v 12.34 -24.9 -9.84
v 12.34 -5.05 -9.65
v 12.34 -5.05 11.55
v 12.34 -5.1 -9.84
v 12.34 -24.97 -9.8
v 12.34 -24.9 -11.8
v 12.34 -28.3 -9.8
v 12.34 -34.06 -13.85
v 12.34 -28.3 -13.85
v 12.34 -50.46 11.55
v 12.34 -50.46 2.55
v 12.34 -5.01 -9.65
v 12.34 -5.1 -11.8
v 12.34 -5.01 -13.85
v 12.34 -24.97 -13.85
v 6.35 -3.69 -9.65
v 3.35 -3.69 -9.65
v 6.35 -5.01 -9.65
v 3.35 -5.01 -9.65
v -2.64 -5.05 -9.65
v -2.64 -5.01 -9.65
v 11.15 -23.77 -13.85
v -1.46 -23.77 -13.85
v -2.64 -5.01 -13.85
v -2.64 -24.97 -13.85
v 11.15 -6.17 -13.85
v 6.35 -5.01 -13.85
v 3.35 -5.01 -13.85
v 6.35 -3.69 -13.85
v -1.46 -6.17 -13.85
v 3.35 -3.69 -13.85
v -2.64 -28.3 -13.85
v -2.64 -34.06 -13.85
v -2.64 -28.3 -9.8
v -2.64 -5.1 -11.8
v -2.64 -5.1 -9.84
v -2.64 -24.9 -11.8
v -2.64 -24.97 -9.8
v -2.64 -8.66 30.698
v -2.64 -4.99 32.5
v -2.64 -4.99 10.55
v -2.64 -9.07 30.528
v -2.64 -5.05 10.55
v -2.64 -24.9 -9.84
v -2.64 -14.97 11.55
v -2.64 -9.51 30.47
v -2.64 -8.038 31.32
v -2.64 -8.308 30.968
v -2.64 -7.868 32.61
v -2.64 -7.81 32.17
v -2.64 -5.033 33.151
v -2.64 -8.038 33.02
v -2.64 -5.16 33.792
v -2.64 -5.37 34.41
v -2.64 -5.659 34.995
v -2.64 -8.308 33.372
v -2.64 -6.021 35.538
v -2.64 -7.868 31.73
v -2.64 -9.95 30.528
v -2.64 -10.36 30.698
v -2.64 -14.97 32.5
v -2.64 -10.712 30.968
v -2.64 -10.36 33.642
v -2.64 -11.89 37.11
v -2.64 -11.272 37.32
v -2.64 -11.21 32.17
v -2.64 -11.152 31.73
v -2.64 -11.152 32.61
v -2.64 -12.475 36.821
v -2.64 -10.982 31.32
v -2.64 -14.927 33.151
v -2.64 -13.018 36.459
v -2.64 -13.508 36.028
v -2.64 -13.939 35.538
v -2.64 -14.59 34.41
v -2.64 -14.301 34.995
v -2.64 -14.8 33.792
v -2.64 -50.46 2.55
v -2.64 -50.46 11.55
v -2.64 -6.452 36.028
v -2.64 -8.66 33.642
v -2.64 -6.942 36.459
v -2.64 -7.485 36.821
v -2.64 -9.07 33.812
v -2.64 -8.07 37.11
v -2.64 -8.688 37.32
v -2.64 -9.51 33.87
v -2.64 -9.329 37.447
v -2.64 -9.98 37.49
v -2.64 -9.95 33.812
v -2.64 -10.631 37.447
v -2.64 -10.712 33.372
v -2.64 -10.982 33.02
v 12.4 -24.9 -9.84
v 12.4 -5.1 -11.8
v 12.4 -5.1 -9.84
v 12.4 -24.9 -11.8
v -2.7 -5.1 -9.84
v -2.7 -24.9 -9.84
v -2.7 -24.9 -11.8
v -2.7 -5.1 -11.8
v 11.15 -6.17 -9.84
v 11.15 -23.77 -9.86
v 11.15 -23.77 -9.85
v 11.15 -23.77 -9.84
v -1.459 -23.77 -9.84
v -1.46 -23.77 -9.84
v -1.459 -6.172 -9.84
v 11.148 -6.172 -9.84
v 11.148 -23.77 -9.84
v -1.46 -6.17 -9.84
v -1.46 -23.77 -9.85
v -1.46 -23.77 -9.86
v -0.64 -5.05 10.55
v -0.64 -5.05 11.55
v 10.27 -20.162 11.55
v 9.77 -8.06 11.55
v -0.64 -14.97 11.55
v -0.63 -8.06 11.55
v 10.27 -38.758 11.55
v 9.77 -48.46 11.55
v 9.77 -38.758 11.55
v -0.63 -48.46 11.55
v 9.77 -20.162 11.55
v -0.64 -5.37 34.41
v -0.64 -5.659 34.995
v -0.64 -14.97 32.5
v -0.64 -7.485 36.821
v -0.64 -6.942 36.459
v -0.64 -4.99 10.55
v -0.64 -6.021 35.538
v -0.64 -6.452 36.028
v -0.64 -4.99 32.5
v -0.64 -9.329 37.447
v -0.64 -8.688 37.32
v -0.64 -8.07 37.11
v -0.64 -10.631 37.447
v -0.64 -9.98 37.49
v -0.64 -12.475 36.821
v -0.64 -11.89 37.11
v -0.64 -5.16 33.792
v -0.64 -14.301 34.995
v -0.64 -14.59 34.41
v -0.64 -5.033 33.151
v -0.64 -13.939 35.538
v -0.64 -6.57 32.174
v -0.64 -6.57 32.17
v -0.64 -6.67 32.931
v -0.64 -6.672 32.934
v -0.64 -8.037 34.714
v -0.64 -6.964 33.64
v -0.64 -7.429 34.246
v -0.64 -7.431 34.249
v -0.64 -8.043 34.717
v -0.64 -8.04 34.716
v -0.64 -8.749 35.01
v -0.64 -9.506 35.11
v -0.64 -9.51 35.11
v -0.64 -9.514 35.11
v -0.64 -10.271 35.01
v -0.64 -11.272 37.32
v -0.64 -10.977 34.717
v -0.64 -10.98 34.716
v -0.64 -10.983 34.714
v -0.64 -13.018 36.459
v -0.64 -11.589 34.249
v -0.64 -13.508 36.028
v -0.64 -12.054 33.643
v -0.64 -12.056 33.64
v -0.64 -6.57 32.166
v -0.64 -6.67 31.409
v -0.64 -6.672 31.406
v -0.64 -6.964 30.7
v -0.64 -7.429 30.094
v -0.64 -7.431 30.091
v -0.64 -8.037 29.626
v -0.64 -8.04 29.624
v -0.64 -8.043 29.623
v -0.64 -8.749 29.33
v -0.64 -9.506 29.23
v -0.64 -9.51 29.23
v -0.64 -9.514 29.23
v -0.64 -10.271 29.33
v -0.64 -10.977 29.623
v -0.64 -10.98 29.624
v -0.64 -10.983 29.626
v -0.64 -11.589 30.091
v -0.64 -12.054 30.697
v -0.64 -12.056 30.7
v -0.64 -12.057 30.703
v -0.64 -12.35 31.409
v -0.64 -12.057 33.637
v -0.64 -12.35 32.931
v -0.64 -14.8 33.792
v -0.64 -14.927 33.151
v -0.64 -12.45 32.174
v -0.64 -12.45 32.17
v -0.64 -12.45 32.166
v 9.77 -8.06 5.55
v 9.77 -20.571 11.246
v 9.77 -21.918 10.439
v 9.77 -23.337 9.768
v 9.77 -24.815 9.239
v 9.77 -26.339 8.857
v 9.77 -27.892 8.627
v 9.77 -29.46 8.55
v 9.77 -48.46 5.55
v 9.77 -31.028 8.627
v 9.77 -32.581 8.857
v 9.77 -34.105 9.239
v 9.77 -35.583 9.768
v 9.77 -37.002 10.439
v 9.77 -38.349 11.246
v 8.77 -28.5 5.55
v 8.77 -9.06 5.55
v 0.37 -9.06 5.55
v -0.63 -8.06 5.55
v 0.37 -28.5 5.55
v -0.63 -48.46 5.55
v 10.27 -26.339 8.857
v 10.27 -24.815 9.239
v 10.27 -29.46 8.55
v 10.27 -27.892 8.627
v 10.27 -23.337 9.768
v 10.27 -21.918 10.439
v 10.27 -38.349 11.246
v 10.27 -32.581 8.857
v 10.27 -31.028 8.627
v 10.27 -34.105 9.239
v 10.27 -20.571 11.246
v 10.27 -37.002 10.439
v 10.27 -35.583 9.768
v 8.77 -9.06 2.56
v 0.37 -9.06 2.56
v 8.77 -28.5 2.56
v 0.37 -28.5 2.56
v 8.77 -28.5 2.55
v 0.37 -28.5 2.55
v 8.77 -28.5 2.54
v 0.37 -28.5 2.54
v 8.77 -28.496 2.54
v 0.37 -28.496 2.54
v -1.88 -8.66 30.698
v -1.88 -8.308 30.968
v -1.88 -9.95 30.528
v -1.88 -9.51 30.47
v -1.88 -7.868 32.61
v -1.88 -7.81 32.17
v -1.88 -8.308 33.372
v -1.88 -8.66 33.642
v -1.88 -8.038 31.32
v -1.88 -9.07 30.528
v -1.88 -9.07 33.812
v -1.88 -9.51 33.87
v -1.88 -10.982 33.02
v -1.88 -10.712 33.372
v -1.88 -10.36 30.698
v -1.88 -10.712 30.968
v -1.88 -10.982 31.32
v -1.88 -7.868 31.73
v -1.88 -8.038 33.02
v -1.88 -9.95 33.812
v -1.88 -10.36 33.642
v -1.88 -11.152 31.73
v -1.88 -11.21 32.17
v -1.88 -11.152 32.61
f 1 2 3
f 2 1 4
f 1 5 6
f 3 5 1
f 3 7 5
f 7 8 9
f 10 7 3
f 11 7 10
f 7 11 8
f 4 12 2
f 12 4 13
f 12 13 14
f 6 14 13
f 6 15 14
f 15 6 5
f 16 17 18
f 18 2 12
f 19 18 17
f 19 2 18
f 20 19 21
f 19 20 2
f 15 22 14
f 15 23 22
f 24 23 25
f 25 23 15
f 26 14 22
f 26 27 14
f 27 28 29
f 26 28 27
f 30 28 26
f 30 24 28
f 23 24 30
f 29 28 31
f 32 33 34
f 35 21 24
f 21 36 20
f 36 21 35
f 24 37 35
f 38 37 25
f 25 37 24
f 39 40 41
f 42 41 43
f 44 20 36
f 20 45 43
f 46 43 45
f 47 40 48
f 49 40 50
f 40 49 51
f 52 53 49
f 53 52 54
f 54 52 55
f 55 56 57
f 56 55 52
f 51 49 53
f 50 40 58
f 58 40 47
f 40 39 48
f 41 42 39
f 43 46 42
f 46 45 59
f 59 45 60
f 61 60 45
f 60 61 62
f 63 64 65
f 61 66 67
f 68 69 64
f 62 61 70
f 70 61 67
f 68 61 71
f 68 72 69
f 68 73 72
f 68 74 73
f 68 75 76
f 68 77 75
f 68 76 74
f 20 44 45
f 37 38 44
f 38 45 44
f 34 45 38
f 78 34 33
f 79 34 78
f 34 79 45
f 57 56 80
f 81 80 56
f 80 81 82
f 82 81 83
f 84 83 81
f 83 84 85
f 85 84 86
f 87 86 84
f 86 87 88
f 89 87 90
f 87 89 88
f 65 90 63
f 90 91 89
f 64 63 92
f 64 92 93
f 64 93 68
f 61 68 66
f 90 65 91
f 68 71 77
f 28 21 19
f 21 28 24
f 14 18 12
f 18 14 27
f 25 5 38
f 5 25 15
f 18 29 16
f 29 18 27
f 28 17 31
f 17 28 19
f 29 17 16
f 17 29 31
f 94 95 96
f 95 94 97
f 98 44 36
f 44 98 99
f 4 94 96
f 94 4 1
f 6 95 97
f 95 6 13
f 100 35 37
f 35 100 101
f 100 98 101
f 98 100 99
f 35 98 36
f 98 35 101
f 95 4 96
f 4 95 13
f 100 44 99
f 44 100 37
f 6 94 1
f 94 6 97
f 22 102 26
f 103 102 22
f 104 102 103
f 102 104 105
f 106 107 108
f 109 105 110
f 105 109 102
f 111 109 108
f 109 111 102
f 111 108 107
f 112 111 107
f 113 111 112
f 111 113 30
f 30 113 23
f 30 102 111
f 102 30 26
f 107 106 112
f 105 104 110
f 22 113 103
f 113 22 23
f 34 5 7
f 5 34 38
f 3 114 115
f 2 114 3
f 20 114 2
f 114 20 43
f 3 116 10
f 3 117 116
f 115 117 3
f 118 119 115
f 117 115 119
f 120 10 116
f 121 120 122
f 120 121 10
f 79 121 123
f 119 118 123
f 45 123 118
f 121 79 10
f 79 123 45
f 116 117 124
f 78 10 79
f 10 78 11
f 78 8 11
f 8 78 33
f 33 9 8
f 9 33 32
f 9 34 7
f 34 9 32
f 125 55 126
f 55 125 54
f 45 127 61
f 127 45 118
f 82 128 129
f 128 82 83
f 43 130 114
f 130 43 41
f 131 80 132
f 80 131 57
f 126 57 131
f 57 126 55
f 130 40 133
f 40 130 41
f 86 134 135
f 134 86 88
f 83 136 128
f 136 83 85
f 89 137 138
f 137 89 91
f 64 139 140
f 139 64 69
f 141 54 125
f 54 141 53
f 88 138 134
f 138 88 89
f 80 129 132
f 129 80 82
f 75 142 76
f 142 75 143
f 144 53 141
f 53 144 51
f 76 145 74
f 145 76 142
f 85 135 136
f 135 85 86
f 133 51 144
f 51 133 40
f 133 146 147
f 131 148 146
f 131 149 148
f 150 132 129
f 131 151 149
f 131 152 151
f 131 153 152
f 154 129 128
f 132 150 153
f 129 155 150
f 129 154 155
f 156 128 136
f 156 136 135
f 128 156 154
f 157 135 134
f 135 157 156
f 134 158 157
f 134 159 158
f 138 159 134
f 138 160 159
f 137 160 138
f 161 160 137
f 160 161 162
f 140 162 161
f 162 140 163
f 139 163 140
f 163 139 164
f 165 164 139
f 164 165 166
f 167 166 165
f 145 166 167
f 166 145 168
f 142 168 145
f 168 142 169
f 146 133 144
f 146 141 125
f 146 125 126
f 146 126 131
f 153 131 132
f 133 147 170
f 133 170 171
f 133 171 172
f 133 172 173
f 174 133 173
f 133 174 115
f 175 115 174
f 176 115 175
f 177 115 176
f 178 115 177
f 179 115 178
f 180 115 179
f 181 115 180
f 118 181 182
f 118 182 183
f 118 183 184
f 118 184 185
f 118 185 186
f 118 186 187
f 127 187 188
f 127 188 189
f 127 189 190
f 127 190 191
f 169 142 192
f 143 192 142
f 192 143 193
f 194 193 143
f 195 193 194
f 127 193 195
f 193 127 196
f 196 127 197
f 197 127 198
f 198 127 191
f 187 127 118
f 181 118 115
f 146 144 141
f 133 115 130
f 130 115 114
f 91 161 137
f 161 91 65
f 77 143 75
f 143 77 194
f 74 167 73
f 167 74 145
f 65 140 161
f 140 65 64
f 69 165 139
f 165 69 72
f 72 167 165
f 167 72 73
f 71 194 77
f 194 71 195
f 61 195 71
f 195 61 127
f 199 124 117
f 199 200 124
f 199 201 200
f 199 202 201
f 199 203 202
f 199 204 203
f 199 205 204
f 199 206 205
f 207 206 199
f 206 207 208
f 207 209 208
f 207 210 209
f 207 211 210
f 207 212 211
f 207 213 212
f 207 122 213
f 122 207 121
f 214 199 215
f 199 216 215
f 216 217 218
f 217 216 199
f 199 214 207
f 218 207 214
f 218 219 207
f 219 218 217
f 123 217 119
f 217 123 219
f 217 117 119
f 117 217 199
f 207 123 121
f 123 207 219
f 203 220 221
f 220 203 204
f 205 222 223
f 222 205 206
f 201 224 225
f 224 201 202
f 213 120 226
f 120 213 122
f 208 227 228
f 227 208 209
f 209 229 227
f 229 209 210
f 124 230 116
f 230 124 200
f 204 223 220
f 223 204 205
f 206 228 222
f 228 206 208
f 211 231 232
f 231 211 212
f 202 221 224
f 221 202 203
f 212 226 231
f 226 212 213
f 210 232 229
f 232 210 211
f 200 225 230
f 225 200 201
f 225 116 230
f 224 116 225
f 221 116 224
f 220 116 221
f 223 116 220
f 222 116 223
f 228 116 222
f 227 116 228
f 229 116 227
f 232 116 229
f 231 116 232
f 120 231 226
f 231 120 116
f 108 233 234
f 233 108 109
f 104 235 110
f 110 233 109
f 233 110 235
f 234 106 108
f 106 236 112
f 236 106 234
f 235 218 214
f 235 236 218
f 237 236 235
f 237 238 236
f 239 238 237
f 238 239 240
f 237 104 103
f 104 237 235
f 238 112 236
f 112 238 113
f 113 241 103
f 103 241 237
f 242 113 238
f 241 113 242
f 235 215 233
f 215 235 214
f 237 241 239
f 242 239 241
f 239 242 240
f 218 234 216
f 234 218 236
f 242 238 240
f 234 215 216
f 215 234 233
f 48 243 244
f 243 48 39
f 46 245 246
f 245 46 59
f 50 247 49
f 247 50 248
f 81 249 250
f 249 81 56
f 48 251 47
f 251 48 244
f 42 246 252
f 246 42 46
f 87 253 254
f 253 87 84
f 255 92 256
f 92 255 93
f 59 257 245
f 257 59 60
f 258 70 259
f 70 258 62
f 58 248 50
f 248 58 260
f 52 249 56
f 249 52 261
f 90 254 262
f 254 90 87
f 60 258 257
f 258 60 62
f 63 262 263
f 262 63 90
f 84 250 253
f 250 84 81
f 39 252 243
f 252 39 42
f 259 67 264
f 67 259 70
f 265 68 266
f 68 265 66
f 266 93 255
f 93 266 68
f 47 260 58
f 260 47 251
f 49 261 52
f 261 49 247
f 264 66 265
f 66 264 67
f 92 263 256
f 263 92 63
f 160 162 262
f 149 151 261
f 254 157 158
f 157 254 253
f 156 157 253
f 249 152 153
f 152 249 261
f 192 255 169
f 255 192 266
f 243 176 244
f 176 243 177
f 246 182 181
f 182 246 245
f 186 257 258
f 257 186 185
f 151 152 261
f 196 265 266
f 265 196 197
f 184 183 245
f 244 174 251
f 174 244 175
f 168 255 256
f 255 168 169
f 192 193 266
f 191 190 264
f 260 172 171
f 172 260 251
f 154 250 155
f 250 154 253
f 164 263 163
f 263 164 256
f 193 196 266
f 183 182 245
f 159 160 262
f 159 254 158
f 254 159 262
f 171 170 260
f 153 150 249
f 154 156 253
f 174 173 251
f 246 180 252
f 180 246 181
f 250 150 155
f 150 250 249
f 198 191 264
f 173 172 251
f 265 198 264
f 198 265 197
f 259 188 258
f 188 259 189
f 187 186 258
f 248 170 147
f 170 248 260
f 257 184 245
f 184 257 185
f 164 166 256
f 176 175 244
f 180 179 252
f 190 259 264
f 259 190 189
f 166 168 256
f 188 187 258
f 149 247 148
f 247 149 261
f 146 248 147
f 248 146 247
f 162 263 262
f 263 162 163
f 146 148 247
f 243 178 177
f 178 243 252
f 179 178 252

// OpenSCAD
// file: lib/duct_body.scad
// Body of the one-piece 4010 ducts — Igneus V2 (Anet ET4/ET5)
// Remix of "IGNEUS V2 - E3D V6/VOLCANO" by Locos3D, CC BY-NC-SA 4.0
// https://www.thingiverse.com/thing:4178590
//
// Same frame as duct4010.scad: right-hand part as mounted, Z+ up, X- towards the nozzle, Y- = front.
// Drawn from scratch as a single part: the curves of the air channel, the rails of the mounting arm and its
// height slot are measured from Locos3D's 5015 duct, so it mounts and aims the air like the original.
// It prints lying on its flat back face (y = 0) without supports: every wall is a prism standing on that
// face or rises at 45 degrees, and what is left as a ceiling is a short bridge.

/* [Internal: one-piece duct body] */
// air channel in the XZ plane: inner wall (nozzle side) and outer wall, both arcs ending in the outlet
ch_near_c  = [-18.38, -19.50];   // centre of the inner wall curve
ch_near_r  = [14.07, 15.58];     // its outer face (towards the nozzle) and channel face
ch_near_a  = 67.7;               // the inner wall ends this many degrees below the horizontal
ch_far_c   = [-8.19, -14.55];    // centre of the outer wall curve
ch_far_r   = [20.67, 22.17];     // its channel face and outer face
ch_far_a   = 79.4;               // the curve ends here and a straight lip aims the air at the nozzle
ch_lip     = [7.3, 7.0];         // lip length: channel face, outer face
ch_back    = -1.5;               // channel back face: 1.5 mm wall on the face it prints on
ch_front   = -25.0;              // channel front face: 3 mm front wall
duct_d     = 28.0;               // depth of the duct (Y)
duct_top   = -9.85;              // top of the curved duct = where the air comes in
roof_c     = 5.0;                // 45° chamfers along the front edges of the channel...
roof_ridge = 4.0;                // ...leaving a flat strip this wide (a short bridge when printing)

// mounting arm: rails that slide into the body's grooves and the slot of the height-adjustment screw
arm_x      = [-12.8, -7.8];      // arm face against the body / outer face (the screw head bears on it)
arm_d      = 11.26;              // arm depth (Y)
arm_top    = 27.3;               // top of the arm
rail_tip   = -14.0;              // the rails stick out of the arm face up to here
rails      = [[0, 1.98], [6.58, 8.56]];   // rail bases (depth from the back face); tips 0.55 mm narrower each side
slot_y     = -4.28;              // height slot: centre (Y), width and the Z range of the screw
slot_w     = 3.3;
slot_z     = [9.09, 25.33];
spine_top  = 5.5;                // the block that joins arm and duct stays under the screw head

// derived: straight faces of the walls
near_out_x = ch_near_c[0] + ch_near_r[0];   // -4.31
near_in_x  = ch_near_c[0] + ch_near_r[1];   // -2.80
far_in_x   = ch_far_c[0] + ch_far_r[0];     // 12.48
far_out_x  = ch_far_c[0] + ch_far_r[1];     // 13.98

function pol(c, r, a) = [c[0] + r * cos(a), c[1] + r * sin(a)];
function lerp(a, b, t) = a + (b - a) * t;
function cw_dir(a) = [sin(a), -cos(a)];     // tangent of a circle at angle a, going clockwise
function seg_n(n) = [for (i = [0 : n]) i / n];

// outer wall, channel face: straight, then the arc, then the lip; f = 0..1 from the height of the inner
// wall's centre (where the inner wall starts to curve) to the tip of the lip
far_a0    = asin((ch_near_c[1] - ch_far_c[1]) / ch_far_r[0]);
far_arc_l = ch_far_r[0] * (ch_far_a + far_a0) * PI / 180;
function far_pt(f) = let(s = f * (far_arc_l + ch_lip[0]))
    s <= far_arc_l ? pol(ch_far_c, ch_far_r[0], far_a0 - s / ch_far_r[0] * 180 / PI)
                   : pol(ch_far_c, ch_far_r[0], -ch_far_a) + (s - far_arc_l) * cw_dir(-ch_far_a);
function near_pt(f) = pol(ch_near_c, ch_near_r[1], -f * ch_near_a);
function far_x_at(z) = z >= ch_far_c[1] ? far_in_x : ch_far_c[0] + sqrt(pow(ch_far_r[0], 2) - pow(z - ch_far_c[1], 2));

// Cross-section of the air path: the line from a (inner side) to b (outer side) in XZ, swept in Y from the
// back face yb to the front face yf, with the two front edges chamfered at 45 degrees by c.
function sec(a, b, yb = ch_back, yf = ch_front, c = roof_c) = [a, b, yb, yf, c];
function sec_pts(s) = let(a = s[0], b = s[1], yb = s[2], yf = s[3], l = norm(b - a), u = (b - a) / l,
                          c = min(s[4], max(0, (l - roof_ridge) / 2)))
    [[a[0], yb, a[1]], [b[0], yb, b[1]], [b[0], yf + c, b[1]],
     [b[0] - c * u[0], yf, b[1] - c * u[1]], [a[0] + c * u[0], yf, a[1] + c * u[1]], [a[0], yf + c, a[1]]];

// solid between consecutive cross-sections (each piece is convex, neighbours share a face)
module loft(secs) for (i = [0 : len(secs) - 2])
    hull() polyhedron(points = concat(sec_pts(secs[i]), sec_pts(secs[i + 1])),
                      faces = [[0, 1, 2, 3, 4, 5], [6, 7, 8, 9, 10, 11]]);

// The curved duct, from its top (duct_top) to 1.5 mm past the outlet
function duct_secs(n = 20) = concat(
    [for (z = [duct_top, -12, ch_far_c[1], -16, -17.5, ch_near_c[1]]) sec([near_in_x, z], [far_x_at(z), z])],
    [for (f = seg_n(n)) if (f > 0) sec(near_pt(f), far_pt(f))],
    [sec(near_pt(1) + 1.5 * cw_dir(-ch_near_a), far_pt(1) + 1.5 * cw_dir(-ch_far_a))]);

module duct_channel() loft(duct_secs());

// XZ outline of the duct walls, from z_top down to the outlet
module duct_outline(z_top = duct_top) {
    a_near = -ch_near_a;
    lip_out_end = pol(ch_far_c, ch_far_r[1], -ch_far_a) + ch_lip[1] * cw_dir(-ch_far_a);
    polygon(concat(
        [[near_out_x, z_top]],
        [for (f = seg_n(16)) pol(ch_near_c, ch_near_r[0], -f * ch_near_a)],   // inner wall, nozzle side
        [pol(ch_near_c, ch_near_r[1], a_near)],                              // its end, across the wall
        [far_pt(1)],                                                         // across the outlet
        [lip_out_end],                                                       // end of the lip
        [for (f = seg_n(24)) pol(ch_far_c, ch_far_r[1], -ch_far_a * (1 - f))],   // outer wall, back up
        [[far_out_x, z_top]]));
}

// the duct walls as a prism standing on the back face
module duct_shell(z_top = duct_top) rotate([90, 0, 0]) linear_extrude(height = duct_d) duct_outline(z_top);

// Arm profile in XY (rails on the face against the body)
module arm_profile() {
    teeth = [for (r = rails) each [[arm_x[0], -r[0]], [rail_tip, -r[0] - 0.55], [rail_tip, -r[1] + 0.55], [arm_x[0], -r[1]]]];
    polygon(concat([[arm_x[1], 0], [arm_x[1], -arm_d], [arm_x[0], -arm_d]], [for (i = [len(teeth) - 1 : -1 : 0]) teeth[i]]));
}

// Mounting arm: the rails slide into the grooves on the side of the Igneus body and the M3 screw goes through
// the height slot into the body. The spine joins it to the duct, below the screw head.
module mount_arm() {
    difference() {
        union() {
            intersection() {
                translate([0, 0, -2]) linear_extrude(height = arm_top + 2) arm_profile();
                // round the top front corner (the back corner stays square: it sits on the bed)
                rotate([90, 0, 90]) translate([0, 0, -20]) linear_extrude(height = 20)
                    offset(r = 3) offset(delta = -3) translate([-arm_d, -10]) square([arm_d + 3, arm_top + 10]);
            }
            // spine: from the arm to the inner wall of the duct, chamfered under the arm
            rotate([90, 0, 0]) linear_extrude(height = arm_d)
                polygon([[arm_x[0], spine_top], [near_out_x, spine_top], [near_out_x, duct_top - 4.1],
                         [near_out_x - 2.2, duct_top - 4.1], [arm_x[0], duct_top + 2.2]]);
        }
        slot();
    }
}

module slot()
    hull() for (z = [slot_z[0] + slot_w / 2, slot_z[1] - slot_w / 2])
        translate([arm_x[0] - 2.5, slot_y, z]) rotate([0, 90, 0]) cylinder(d = slot_w, h = arm_x[1] - arm_x[0] + 5, $fn = 24);
// file: lib/fan_adapter.scad
// 25 mm fan (Anycubic Kobra X 2510 hotend fan) -> Locos3D's 30 mm fan clamp (Abrazadera_Adapter_Fan_30mm).
// Library: parameters and the fan_adapter() module, in its own local frame (z = 0 against the clamp).
//
// The clamp's 30 mm pattern (24 mm between holes) cannot hold the plate: those holes sit under the
// 25 mm fan and clash with its 20 mm pattern. Instead the plate has a tab on top that is held by the
// clamp's own two M3 screws (about 4 mm longer than before): bosses fill their counterbores and the
// heads sit flush in the tab. Two pins go into the lower 30 mm holes so the plate cannot turn.
$fn = 48;

/* [Fan — check yours with calipers] */
fan_side        = 25;    // fan size (mm)
fan_holes       = 20;    // distance between the fan's screw holes (mm)
fan_pilot       = 2.2;   // pilot hole for self-tapping M2.5 screws
fan_pilot_depth = 3.2;
fan_bore        = 23.6;  // air opening

/* [Clamp — measured on Abrazadera_Adapter_Fan_30mm] */
face      = -27.06;       // front face of the clamp plate (view Y)
cz        = -5.05;        // centre of the 30 mm pattern (view Z)
m3        = [11, 15.65];  // clamp screws at x = ±m3[0], z = m3[1]
cb_d      = 7.08;         // counterbore of those screws
cb_depth  = 3.0;
pin_holes = 12;           // 30 mm pattern at ±12 around the centre; the lower two take the pins
pin_d     = 2.4;
pin_h     = 3.0;

/* [Adapter] */
plate_t    = 4.0;
boss_clear = 0.15;        // per side, inside the counterbores
head_d     = 6.2;         // recess for the M3 socket heads
head_depth = 3.2;
margin     = 1.6;         // wall around the head recesses

x_half = m3[0] + head_d / 2 + margin;
z_top  = m3[1] + head_d / 2 + margin;
z_bot  = cz - fan_side / 2 - 2.5;

module fan_adapter() {
    difference() {
        union() {
            // plate, z = 0 against the clamp, z = plate_t on the fan side
            linear_extrude(height = plate_t) offset(r = 2) offset(delta = -2)
                translate([-x_half, z_bot]) square([2 * x_half, z_top - z_bot]);
            // bosses that fill the clamp counterbores
            for (s = [-1, 1]) translate([s * m3[0], m3[1], -(cb_depth - 0.2)])
                cylinder(d = cb_d - 2 * boss_clear, h = cb_depth - 0.2 + 0.01);
            // anti-rotation pins
            for (s = [-1, 1]) translate([s * pin_holes, cz - pin_holes, -pin_h])
                cylinder(d = pin_d, h = pin_h + 0.01, $fn = 24);
        }
        translate([0, cz, -1]) cylinder(d = fan_bore, h = plate_t + 2);
        for (s = [-1, 1]) translate([s * m3[0], m3[1], 0]) {
            translate([0, 0, -cb_depth - 1]) cylinder(d = 3.4, h = cb_depth + plate_t + 2);
            translate([0, 0, plate_t - head_depth]) cylinder(d = head_d, h = head_depth + 1);
        }
        for (x = [-1, 1], y = [-1, 1]) translate([x * fan_holes / 2, cz + y * fan_holes / 2, plate_t - fan_pilot_depth])
            cylinder(d = fan_pilot, h = fan_pilot_depth + 1, $fn = 20);
    }
}
// file: lib/flat4010.scad
// Flat variant of the 4010 adapter — Igneus V2 (Anet ET4/ET5)
// Remix of "IGNEUS V2 - E3D V6/VOLCANO" by Locos3D, CC BY-NC-SA 4.0
// https://www.thingiverse.com/thing:4178590
//
// The 4010 blower sits on top of the adapter with its intake facing the front (like the 2510 hotend fan),
// as low as possible: the fan pocket sits right on top of the nozzle that goes into the original 5015 duct.
// Same coordinate system as duct4010.scad (right-hand part, as mounted; Y- = front).
include <duct4010.scad>

/* [Flat variant] */
flat_floor    = 3.0;            // floor between the nozzle and the fan (mm)
flat_cradle_h = 8.0;            // cradle depth (mm): in this variant the fan is held by the cradle alone
flat_front_h  = 5.0;            // one-piece duct: front wall of the cradle, below the blower's intake (mm)
flat_outlet   = [1.2, 16.2];    // fan outlet along its bottom edge, measured from the inner end (mm)
flat_fan_x0   = -0.6;           // inner side of the fan (just clear of the duct arm, whose face is at x = -2.8)
flat_fan_y0   = -19.4;          // front face of the fan (intake), centred over the nozzle
flat_z_seat   = nozzle_top + flat_floor;   // where the bottom edge of the fan rests

flat_cradle_x = [-2.8, flat_fan_x0 + fan_w + clearance + cradle_wall];
flat_cradle_y = [flat_fan_y0 - clearance - cradle_wall, flat_fan_y0 + fan_t + clearance + cradle_wall];
function flat_out_x() = [flat_fan_x0 + flat_outlet[0], flat_fan_x0 + flat_outlet[1]];
function flat_out_y() = [flat_fan_y0 + 1.0, flat_fan_y0 + fan_t - 1.0];

// Floor over the top of the nozzle (stopping at y = -5.1, in front of the two ribs on the inside of the duct's
// back plate), and the cradle block on it, 0.15 mm above the top edges of the duct walls. Where the floor is
// wider than the cradle it narrows at 45° (or steeper) up to it, and a wedge in the socket's notch covers the
// top of the key tab: printed upside down, nothing sticks out into the air.
module flat_body() {
    w = x_ext[1] - x_ext[0];
    hull() {
        translate([x_ext[0], -24.9, nozzle_top]) cube([w, 19.8, eps]);
        translate([x_ext[0], flat_cradle_y[0], nozzle_top + 3.3]) cube([w, flat_cradle_y[1] - flat_cradle_y[0], eps]);
    }
    kx = [socket_key[0][0] + 0.15, socket_key[0][1] - 0.15];
    ky = socket_key[1] - 0.19;                   // back face of the key tab
    translate([kx[0], 0, 0]) rotate([90, 0, 90]) linear_extrude(height = kx[1] - kx[0])
        polygon([[-7.3, nozzle_top], [ky, nozzle_top], [ky, nozzle_top + 0.2], [-7.3, nozzle_top + 0.2 + ky + 7.3]]);
    translate([flat_cradle_x[0], flat_cradle_y[0], nozzle_top + 0.15])
        cube([flat_cradle_x[1] - flat_cradle_x[0], flat_cradle_y[1] - flat_cradle_y[0], flat_floor - 0.15 + flat_cradle_h]);
}

// Air path: through the nozzle, then a short taper into the fan outlet
module flat_air() {
    in_w = nozzle_in[1] - nozzle_in[0];
    translate([nozzle_in[0][0], nozzle_in[0][1], -16]) cube([in_w[0], in_w[1], 16 + nozzle_top + eps]);
    hull() {
        translate([nozzle_in[0][0], nozzle_in[0][1], nozzle_top]) cube([in_w[0], in_w[1], eps]);
        translate([flat_out_x()[0], flat_out_y()[0], flat_z_seat])
            cube([flat_out_x()[1] - flat_out_x()[0], flat_out_y()[1] - flat_out_y()[0], eps]);
    }
}

module flat_pocket() {
    translate([flat_fan_x0 - clearance, flat_fan_y0 - clearance, flat_z_seat])
        cube([fan_w + 2 * clearance, fan_t + 2 * clearance, flat_cradle_h + 40]);
    // relief for the ring round the intake (see fan_pocket); impeller axis 21.2 mm from the inner end, 19 mm up
    translate([flat_fan_x0 + 21.2, flat_fan_y0 - clearance + eps, flat_z_seat + 19])
        rotate([90, 0, 0]) cylinder(d = intake_rim, h = 0.5 + eps, $fn = 64);
}

// Flat 4010 adapter for the original 5015 duct (separate part). Prints upside down without supports.
module adapter4010_flat()
    difference() {
        union() { nozzle(); flat_body(); }
        flat_air();
        flat_pocket();
    }

// One-piece duct, flat version: duct, floor, cradle and mounting arm drawn as one part, with the LED channel.
// Prints lying on its flat back face without supports; the low front wall of the cradle is a bridge between
// the two end walls.
module duct4010_flat() {
    cx = [near_out_x, flat_cradle_x[1]];   cy = flat_cradle_y;   // the inner end wall reaches the duct's wall
    zt = flat_z_seat + flat_cradle_h;
    px0 = flat_fan_x0 - clearance;
    back = cy[1] - cradle_wall;          // back wall of the cradle, behind the fan
    ox = flat_out_x();   oy = flat_out_y();
    plenum = [sec([ox[0], flat_z_seat + 0.5], [ox[1], flat_z_seat + 0.5], oy[1], oy[0], 0),
              sec([ox[0], flat_z_seat], [ox[1], flat_z_seat], oy[1], oy[0], 0)];
    difference() {
        union() {
            duct_shell(duct_top);
            // floor: over the duct and under the whole cradle
            translate([near_out_x, -duct_d, duct_top - eps]) cube([far_out_x - near_out_x, duct_d, flat_floor + eps]);
            translate([cx[0], cy[0], duct_top - eps]) cube([cx[1] - cx[0], -cy[0], flat_floor + eps]);
            // cradle walls: low front wall, full-height end walls and back wall
            translate([cx[0], cy[0], flat_z_seat - eps]) cube([cx[1] - cx[0], cy[1] - cy[0], min(flat_front_h, flat_cradle_h) + eps]);
            for (w = [[cx[0], px0], [cx[1] - cradle_wall, cx[1]]])
                translate([w[0], cy[0], flat_z_seat - eps]) cube([w[1] - w[0], cy[1] - cy[0], zt - flat_z_seat + eps]);
            translate([cx[0], back, flat_z_seat - eps]) cube([cx[1] - cx[0], cy[1] - back, zt - flat_z_seat + eps]);
            // behind the cradle, down to the back face at 45°
            hull() {
                translate([cx[0], cy[1] - eps, duct_top]) cube([cx[1] - cx[0], eps, zt - duct_top]);
                translate([cx[0], -eps, duct_top]) cube([cx[1] - cx[0] + cy[1], eps, zt - duct_top + cy[1]]);
            }
            mount_arm();
            if (led) led_channel();
        }
        loft(concat(plenum, duct_secs()));
        flat_pocket();
        slot();
    }
}

echo(str("Flat cradle: ", fan_w + 2 * clearance, " x ", fan_t + 2 * clearance, " mm, fan edge at z = ", flat_z_seat));
// main file
// color: #1d1d1f
// variant: customizer
// Igneus V2 for the Anet ET4 — customizer. Remix of "IGNEUS V2 - E3D V6/VOLCANO" by Locos3D, CC BY-NC-SA 4.0
// (https://www.thingiverse.com/thing:4178590).
//
// Open this file in OpenSCAD, show the Customizer (Window > Customizer), pick a part, enter your measurements,
// render (F6) and export the STL (F7). Only the LED mount needs an original Igneus file (the 5015 duct it is
// carved against): see ../igneus/README.md.

include <lib/flat4010.scad>     // also brings in lib/duct4010.scad
include <lib/fan_adapter.scad>

/* [Part] */
// Which part to make
part = "adapter_4010"; // [adapter_4010:4010 adapter (normal), adapter_4010_flat:4010 adapter (flat), led_mount:LED mount for the original duct, duct_4010_led:One-piece duct with LED channel (normal), duct_4010_led_flat:One-piece duct with LED channel (flat), fan_adapter_2510_30:2510 fan to the 30 mm clamp]
// Right or left side (mirror images; ignored for the fan adapter)
side = "right"; // [right, left]
// Ready to print, or as it sits on the printer
orientation = "print"; // [print:Ready to print, mounted:As mounted]

/* [4010 blower — measure yours] */
// Fan thickness (mm)
fan_t = 10.0; // [8:0.05:12]
// Length of the fan edge that sits in the cradle (mm)
fan_w = 40.0; // [38:0.05:42]
// Clearance per side in the cradle (mm)
clearance = 0.20; // [0:0.05:0.6]
// Cradle depth, normal version (mm)
cradle_h = 6.0; // [3:0.5:12]
// Cradle depth, flat version (mm)
flat_cradle_h = 8.0; // [4:0.5:14]
// Floor under the fan, flat version (mm)
flat_floor = 3.0; // [2:0.25:6]
// Clearance per side of the adapter nozzle inside the duct (mm)
nozzle_clear = 0.10; // [0:0.02:0.3]

/* [LED strip — measure yours] */
// Add the LED channel to the one-piece ducts
led = true;
// Strip width (mm)
led_w = 10.0; // [6:0.1:14]
// Strip thickness without the lenses, with the adhesive (mm)
led_t = 0.8; // [0.3:0.05:3]
// Diameter of the LED lenses (mm)
led_lens = 8.0; // [3:0.1:12]
// LEDs per side
led_n = 2; // [1:1:3]
// Distance between LEDs = between cut marks (mm)
led_pitch = 18.1; // [8:0.1:40]
// Beam tilt: 0 = level towards the nozzle, 90 = straight down (degrees)
led_ang = 15; // [0:1:45]
// Strip clearance in the channel (mm)
led_clear = 0.3; // [0:0.05:0.8]
// Clearance of the LED mount against the duct (mm)
mount_clear = 0.15; // [0:0.05:0.5]

/* [2510 fan adapter — measure yours] */
// Fan size (mm)
fan_side = 25; // [20:1:30]
// Distance between the fan's screw holes (mm)
fan_holes = 20; // [16:0.5:24]
// Pilot hole for self-tapping M2.5 screws (mm)
fan_pilot = 2.2; // [1.8:0.1:3]

/* [Hidden] */
$fn = 48;

module side_of() if (side == "left") mirror([1, 0, 0]) children(); else children();
module ready(rot) if (orientation == "print") rotate(rot) children(); else children();

if (part == "adapter_4010")        ready([0, 0, 0])   side_of() adapter4010();
if (part == "adapter_4010_flat")   ready([180, 0, 0]) side_of() adapter4010_flat();
if (part == "led_mount")           ready([-90, 0, 0]) side_of() led_mount();
if (part == "duct_4010_led")       ready([-90, 0, 0]) side_of() duct4010();
if (part == "duct_4010_led_flat")  ready([-90, 0, 0]) side_of() duct4010_flat();
if (part == "fan_adapter_2510_30") {
    if (orientation == "print") rotate([180, 0, 0]) fan_adapter();   // fan side down
    else translate([0, face, 0]) rotate([90, 0, 0]) fan_adapter();
}
